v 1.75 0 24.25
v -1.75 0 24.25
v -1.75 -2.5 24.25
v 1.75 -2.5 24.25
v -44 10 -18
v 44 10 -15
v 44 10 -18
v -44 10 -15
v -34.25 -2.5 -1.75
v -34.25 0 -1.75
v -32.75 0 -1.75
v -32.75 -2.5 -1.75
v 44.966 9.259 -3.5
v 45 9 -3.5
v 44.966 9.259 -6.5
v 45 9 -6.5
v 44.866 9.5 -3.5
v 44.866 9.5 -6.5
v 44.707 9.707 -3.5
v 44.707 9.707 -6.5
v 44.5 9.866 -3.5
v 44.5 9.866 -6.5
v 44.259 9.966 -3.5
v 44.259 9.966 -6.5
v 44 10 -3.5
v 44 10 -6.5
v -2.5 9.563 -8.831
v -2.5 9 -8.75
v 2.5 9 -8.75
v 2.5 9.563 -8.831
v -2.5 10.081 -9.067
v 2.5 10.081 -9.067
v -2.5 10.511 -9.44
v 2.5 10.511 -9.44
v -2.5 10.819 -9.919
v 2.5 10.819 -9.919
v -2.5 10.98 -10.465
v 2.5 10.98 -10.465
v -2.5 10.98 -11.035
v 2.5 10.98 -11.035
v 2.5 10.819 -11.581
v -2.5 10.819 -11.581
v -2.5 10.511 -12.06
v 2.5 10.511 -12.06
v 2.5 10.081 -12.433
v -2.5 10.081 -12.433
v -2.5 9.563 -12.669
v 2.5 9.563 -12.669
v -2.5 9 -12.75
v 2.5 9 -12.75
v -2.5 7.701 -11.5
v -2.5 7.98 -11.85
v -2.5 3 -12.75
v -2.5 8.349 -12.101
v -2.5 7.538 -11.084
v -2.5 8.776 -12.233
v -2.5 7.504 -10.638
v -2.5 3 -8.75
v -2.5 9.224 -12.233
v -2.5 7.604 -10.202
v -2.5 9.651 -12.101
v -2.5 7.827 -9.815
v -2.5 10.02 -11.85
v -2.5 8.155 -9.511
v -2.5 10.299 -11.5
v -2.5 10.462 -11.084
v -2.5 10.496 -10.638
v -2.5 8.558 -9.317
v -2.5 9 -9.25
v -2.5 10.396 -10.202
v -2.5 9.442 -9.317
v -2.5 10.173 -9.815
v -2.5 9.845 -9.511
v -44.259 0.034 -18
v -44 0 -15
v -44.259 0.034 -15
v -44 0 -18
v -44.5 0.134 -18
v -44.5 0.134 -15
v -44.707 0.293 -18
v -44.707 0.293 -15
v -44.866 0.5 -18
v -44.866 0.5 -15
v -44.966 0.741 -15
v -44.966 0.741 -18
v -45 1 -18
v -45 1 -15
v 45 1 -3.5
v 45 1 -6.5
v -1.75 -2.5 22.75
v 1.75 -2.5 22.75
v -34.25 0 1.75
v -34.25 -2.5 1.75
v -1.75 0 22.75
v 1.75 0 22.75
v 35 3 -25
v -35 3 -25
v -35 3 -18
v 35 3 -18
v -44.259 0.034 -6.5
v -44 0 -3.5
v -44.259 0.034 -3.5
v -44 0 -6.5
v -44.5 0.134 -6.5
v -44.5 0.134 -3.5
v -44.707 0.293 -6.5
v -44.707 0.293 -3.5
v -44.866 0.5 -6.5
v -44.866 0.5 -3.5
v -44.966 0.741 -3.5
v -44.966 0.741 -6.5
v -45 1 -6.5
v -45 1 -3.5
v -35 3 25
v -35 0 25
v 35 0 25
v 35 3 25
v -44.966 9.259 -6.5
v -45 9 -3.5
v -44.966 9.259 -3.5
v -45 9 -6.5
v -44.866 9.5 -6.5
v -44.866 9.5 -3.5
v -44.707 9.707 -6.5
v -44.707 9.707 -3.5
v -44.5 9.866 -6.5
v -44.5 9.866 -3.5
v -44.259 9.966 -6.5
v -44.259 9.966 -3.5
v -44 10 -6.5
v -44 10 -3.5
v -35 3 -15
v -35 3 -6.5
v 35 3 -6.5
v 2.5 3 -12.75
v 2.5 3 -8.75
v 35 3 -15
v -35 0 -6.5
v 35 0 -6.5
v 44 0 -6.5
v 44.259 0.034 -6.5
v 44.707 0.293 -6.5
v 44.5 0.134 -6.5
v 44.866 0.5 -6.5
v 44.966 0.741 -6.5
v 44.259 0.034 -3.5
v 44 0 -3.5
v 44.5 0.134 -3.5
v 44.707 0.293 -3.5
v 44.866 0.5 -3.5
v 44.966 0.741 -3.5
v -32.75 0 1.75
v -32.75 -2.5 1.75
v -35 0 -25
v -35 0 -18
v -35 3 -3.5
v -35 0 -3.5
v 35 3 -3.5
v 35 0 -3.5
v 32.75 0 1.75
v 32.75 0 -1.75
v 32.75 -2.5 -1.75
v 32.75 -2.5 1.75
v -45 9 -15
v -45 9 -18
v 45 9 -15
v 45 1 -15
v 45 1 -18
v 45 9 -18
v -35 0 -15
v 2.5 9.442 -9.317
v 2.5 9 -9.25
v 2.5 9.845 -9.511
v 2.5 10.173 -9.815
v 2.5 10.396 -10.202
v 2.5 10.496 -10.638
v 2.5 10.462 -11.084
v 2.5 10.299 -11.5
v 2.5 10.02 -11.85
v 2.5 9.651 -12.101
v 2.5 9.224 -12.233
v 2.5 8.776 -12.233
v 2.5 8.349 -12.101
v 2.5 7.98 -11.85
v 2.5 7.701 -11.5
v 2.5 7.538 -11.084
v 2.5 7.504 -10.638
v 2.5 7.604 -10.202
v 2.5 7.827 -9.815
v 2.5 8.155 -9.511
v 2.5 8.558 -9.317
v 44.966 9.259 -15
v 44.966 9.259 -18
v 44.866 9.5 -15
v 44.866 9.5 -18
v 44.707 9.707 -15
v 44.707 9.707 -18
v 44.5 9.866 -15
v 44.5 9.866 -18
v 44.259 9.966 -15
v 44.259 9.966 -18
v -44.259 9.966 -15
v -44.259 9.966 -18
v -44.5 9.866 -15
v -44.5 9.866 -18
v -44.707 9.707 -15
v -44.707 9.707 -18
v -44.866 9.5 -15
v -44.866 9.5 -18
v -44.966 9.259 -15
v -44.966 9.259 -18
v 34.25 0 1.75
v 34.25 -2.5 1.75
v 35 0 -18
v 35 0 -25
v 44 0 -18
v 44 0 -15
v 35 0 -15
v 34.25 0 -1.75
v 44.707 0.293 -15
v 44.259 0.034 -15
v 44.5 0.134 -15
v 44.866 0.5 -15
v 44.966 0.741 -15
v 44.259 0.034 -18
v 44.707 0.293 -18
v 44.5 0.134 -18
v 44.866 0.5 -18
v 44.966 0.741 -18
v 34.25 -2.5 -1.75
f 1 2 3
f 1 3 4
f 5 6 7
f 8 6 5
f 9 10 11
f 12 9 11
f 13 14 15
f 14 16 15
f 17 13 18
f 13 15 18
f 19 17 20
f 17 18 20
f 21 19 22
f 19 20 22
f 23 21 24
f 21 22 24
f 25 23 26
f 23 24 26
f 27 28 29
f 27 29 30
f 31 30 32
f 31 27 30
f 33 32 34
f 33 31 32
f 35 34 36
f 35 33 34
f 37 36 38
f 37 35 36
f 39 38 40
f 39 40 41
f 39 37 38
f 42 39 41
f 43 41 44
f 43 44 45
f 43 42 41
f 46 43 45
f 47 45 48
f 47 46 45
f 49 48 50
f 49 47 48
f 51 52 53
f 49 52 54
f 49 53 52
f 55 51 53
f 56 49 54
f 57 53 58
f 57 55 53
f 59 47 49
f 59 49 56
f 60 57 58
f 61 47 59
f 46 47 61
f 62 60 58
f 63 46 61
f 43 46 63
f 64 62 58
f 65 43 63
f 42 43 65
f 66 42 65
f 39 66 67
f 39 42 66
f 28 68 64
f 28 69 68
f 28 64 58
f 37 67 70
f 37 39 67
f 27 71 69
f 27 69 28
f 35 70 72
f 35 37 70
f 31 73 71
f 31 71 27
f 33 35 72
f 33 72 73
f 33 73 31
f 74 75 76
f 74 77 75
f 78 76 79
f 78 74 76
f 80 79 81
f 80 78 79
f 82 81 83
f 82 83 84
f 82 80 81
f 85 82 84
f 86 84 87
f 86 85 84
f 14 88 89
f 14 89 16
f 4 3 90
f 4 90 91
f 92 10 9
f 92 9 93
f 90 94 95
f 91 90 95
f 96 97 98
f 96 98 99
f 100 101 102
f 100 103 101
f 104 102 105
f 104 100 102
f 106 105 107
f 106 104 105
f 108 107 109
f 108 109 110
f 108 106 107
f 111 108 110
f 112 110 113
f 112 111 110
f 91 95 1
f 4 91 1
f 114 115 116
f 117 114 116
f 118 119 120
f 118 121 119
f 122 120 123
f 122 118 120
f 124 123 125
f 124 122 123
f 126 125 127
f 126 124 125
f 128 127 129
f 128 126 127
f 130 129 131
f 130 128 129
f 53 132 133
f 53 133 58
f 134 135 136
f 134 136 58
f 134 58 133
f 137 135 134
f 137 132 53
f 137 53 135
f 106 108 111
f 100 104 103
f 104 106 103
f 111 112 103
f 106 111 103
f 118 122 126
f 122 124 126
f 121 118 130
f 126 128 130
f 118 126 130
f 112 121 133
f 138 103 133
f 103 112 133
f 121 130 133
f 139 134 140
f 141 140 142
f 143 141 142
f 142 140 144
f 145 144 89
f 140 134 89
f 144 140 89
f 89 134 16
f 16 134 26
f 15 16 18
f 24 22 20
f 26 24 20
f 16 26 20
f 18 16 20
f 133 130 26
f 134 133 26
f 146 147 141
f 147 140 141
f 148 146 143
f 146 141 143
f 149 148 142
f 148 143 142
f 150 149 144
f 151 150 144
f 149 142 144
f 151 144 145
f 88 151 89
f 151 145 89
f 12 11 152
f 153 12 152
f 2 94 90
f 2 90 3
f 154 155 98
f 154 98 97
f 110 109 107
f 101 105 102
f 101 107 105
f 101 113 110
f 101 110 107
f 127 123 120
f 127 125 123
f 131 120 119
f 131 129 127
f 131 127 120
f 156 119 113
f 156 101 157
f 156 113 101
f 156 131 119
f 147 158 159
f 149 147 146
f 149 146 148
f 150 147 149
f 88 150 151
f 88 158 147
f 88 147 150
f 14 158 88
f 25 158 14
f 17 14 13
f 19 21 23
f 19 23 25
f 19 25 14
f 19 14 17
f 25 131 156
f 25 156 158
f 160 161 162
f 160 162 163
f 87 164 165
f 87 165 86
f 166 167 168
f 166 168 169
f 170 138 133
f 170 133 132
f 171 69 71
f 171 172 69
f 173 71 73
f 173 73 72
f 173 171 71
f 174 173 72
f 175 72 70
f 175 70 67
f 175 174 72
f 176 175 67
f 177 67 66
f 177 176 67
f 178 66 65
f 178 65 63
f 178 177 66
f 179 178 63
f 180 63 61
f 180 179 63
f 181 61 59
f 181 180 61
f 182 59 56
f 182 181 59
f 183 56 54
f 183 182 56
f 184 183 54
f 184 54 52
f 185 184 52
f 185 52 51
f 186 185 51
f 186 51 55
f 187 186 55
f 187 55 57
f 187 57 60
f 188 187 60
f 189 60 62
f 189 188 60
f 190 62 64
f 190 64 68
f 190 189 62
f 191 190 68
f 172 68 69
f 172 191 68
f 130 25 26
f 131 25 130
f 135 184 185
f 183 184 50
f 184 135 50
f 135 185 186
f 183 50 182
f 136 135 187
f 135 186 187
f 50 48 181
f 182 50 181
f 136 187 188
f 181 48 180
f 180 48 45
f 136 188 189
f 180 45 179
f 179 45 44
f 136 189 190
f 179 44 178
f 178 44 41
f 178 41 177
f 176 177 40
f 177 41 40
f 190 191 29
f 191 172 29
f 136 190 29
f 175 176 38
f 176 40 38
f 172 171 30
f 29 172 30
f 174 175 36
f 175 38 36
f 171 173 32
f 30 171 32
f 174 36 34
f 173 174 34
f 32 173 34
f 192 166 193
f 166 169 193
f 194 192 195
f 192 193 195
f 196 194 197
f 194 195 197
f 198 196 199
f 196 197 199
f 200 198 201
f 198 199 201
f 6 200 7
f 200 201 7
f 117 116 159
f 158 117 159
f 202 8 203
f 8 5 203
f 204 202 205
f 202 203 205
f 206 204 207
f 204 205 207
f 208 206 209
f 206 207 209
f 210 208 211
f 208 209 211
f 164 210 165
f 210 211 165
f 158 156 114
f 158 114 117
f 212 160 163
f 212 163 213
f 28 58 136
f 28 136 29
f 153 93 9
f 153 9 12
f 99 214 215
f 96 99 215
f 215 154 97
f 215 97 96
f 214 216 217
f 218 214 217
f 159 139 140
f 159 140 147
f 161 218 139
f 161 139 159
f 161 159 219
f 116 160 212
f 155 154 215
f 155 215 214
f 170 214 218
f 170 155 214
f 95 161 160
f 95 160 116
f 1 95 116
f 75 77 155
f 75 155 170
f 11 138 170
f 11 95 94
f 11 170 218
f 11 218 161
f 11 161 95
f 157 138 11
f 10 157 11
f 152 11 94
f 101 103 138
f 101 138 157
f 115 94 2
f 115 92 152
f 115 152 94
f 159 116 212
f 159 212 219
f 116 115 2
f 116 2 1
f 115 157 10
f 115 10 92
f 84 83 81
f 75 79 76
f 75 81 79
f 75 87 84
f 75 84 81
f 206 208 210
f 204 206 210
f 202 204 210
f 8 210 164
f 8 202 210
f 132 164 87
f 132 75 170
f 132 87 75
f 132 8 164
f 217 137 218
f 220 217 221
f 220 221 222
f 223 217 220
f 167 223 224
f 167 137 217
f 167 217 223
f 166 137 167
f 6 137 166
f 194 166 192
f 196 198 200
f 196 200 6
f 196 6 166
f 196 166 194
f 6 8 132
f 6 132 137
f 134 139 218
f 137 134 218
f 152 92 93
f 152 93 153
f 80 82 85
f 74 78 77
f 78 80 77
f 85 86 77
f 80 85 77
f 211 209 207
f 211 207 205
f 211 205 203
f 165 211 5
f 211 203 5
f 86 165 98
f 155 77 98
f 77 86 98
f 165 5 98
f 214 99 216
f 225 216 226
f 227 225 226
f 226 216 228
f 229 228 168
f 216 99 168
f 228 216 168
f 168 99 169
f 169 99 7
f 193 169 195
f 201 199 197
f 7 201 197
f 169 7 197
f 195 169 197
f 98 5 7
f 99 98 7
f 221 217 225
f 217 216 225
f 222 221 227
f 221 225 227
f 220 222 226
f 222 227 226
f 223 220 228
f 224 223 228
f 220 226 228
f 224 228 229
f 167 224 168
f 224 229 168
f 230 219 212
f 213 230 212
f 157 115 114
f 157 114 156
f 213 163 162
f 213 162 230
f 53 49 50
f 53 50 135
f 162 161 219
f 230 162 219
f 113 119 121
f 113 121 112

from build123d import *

# Parameters (mm, degrees)
SKETCH1_W              = 70
SKETCH1_H              = 50
BOSS_EXTRUDE1_DEPTH    = 3
SKETCH2_W              = 3.5
SKETCH2_H              = 1.5
SKETCH2_W_2            = 1.5
SKETCH2_H_2            = 3.5
BOSS_EXTRUDE2_DEPTH    = 2.5
BOSS_EXTRUDE3_DEPTH    = 3
FILLET1_R              = 1
LPATTERN1_COUNT        = 2
LPATTERN1_PITCH        = 11.5
FILLET1_OF_LPATTERN1_R = 1
SKETCH6_R              = 1.5
BOSS_EXTRUDE4_DEPTH    = 2.5


with BuildPart() as part:
    # Sketch1 → Boss-Extrude1 (new body)
    with BuildSketch(Plane(origin=(0, 0, 0), x_dir=(1, 0, 0), z_dir=(0, 1, 0))):
        Rectangle(SKETCH1_W, SKETCH1_H)
    extrude(amount=BOSS_EXTRUDE1_DEPTH)

    # Sketch2 → Boss-Extrude2 (add)
    with BuildSketch(Plane.XZ):
        with Locations((0, 23.5)):
            Rectangle(SKETCH2_W, SKETCH2_H)
        with Locations((33.5, 0)):
            Rectangle(SKETCH2_W_2, SKETCH2_H_2)
        with Locations((-33.5, 0)):
            Rectangle(SKETCH2_W_2, SKETCH2_H_2)
    extrude(amount=BOSS_EXTRUDE2_DEPTH)

    # Sketch5 → Boss-Extrude3 (add)
    with BuildSketch(Plane.XY.offset(-15)):
        Polygon((35, 3), (35, 0), (45, 0), (45, 10), (-45, 10), (-45, 0), (-35, 0), (-35, 3), align=None)
    boss_extrude3 = extrude(amount=-BOSS_EXTRUDE3_DEPTH)

    # Fillet1
    fillet1_edges = [part.edges().sort_by_distance(p)[0] for p in [
        (-45, 0, -16.5),
        (-45, 10, -16.5),
        (45, 10, -16.5),
        (45, 0, -16.5),
    ]]
    fillet(fillet1_edges, radius=FILLET1_R)

    # LPattern1: Boss-Extrude3 ×2
    with Locations(*[(0, 0, i * LPATTERN1_PITCH) for i in range(1, LPATTERN1_COUNT)]):
        add(boss_extrude3)

    # Fillet1 of LPattern1
    fillet1_of_lpattern1_edges = [part.edges().sort_by_distance(p)[0] for p in [
        (-45, 0, -5),
        (-45, 10, -5),
        (45, 10, -5),
        (45, 0, -5),
    ]]
    fillet(fillet1_of_lpattern1_edges, radius=FILLET1_OF_LPATTERN1_R)

    # Sketch6 → Boss-Extrude4 (add, symmetric)
    with BuildSketch(Plane.ZY):
        with BuildLine():
            Line((-12.75, 0), (-8.75, 0))
            Line((-8.75, 0), (-8.75, 9))
            ThreePointArc((-8.75, 9), (-10.75, 11), (-12.75, 9))
            Line((-12.75, 9), (-12.75, 0))
        make_face()
        with Locations((-10.75, 9)):
            Circle(SKETCH6_R, mode=Mode.SUBTRACT)
    extrude(amount=BOSS_EXTRUDE4_DEPTH, both=True)


solid = part.part
